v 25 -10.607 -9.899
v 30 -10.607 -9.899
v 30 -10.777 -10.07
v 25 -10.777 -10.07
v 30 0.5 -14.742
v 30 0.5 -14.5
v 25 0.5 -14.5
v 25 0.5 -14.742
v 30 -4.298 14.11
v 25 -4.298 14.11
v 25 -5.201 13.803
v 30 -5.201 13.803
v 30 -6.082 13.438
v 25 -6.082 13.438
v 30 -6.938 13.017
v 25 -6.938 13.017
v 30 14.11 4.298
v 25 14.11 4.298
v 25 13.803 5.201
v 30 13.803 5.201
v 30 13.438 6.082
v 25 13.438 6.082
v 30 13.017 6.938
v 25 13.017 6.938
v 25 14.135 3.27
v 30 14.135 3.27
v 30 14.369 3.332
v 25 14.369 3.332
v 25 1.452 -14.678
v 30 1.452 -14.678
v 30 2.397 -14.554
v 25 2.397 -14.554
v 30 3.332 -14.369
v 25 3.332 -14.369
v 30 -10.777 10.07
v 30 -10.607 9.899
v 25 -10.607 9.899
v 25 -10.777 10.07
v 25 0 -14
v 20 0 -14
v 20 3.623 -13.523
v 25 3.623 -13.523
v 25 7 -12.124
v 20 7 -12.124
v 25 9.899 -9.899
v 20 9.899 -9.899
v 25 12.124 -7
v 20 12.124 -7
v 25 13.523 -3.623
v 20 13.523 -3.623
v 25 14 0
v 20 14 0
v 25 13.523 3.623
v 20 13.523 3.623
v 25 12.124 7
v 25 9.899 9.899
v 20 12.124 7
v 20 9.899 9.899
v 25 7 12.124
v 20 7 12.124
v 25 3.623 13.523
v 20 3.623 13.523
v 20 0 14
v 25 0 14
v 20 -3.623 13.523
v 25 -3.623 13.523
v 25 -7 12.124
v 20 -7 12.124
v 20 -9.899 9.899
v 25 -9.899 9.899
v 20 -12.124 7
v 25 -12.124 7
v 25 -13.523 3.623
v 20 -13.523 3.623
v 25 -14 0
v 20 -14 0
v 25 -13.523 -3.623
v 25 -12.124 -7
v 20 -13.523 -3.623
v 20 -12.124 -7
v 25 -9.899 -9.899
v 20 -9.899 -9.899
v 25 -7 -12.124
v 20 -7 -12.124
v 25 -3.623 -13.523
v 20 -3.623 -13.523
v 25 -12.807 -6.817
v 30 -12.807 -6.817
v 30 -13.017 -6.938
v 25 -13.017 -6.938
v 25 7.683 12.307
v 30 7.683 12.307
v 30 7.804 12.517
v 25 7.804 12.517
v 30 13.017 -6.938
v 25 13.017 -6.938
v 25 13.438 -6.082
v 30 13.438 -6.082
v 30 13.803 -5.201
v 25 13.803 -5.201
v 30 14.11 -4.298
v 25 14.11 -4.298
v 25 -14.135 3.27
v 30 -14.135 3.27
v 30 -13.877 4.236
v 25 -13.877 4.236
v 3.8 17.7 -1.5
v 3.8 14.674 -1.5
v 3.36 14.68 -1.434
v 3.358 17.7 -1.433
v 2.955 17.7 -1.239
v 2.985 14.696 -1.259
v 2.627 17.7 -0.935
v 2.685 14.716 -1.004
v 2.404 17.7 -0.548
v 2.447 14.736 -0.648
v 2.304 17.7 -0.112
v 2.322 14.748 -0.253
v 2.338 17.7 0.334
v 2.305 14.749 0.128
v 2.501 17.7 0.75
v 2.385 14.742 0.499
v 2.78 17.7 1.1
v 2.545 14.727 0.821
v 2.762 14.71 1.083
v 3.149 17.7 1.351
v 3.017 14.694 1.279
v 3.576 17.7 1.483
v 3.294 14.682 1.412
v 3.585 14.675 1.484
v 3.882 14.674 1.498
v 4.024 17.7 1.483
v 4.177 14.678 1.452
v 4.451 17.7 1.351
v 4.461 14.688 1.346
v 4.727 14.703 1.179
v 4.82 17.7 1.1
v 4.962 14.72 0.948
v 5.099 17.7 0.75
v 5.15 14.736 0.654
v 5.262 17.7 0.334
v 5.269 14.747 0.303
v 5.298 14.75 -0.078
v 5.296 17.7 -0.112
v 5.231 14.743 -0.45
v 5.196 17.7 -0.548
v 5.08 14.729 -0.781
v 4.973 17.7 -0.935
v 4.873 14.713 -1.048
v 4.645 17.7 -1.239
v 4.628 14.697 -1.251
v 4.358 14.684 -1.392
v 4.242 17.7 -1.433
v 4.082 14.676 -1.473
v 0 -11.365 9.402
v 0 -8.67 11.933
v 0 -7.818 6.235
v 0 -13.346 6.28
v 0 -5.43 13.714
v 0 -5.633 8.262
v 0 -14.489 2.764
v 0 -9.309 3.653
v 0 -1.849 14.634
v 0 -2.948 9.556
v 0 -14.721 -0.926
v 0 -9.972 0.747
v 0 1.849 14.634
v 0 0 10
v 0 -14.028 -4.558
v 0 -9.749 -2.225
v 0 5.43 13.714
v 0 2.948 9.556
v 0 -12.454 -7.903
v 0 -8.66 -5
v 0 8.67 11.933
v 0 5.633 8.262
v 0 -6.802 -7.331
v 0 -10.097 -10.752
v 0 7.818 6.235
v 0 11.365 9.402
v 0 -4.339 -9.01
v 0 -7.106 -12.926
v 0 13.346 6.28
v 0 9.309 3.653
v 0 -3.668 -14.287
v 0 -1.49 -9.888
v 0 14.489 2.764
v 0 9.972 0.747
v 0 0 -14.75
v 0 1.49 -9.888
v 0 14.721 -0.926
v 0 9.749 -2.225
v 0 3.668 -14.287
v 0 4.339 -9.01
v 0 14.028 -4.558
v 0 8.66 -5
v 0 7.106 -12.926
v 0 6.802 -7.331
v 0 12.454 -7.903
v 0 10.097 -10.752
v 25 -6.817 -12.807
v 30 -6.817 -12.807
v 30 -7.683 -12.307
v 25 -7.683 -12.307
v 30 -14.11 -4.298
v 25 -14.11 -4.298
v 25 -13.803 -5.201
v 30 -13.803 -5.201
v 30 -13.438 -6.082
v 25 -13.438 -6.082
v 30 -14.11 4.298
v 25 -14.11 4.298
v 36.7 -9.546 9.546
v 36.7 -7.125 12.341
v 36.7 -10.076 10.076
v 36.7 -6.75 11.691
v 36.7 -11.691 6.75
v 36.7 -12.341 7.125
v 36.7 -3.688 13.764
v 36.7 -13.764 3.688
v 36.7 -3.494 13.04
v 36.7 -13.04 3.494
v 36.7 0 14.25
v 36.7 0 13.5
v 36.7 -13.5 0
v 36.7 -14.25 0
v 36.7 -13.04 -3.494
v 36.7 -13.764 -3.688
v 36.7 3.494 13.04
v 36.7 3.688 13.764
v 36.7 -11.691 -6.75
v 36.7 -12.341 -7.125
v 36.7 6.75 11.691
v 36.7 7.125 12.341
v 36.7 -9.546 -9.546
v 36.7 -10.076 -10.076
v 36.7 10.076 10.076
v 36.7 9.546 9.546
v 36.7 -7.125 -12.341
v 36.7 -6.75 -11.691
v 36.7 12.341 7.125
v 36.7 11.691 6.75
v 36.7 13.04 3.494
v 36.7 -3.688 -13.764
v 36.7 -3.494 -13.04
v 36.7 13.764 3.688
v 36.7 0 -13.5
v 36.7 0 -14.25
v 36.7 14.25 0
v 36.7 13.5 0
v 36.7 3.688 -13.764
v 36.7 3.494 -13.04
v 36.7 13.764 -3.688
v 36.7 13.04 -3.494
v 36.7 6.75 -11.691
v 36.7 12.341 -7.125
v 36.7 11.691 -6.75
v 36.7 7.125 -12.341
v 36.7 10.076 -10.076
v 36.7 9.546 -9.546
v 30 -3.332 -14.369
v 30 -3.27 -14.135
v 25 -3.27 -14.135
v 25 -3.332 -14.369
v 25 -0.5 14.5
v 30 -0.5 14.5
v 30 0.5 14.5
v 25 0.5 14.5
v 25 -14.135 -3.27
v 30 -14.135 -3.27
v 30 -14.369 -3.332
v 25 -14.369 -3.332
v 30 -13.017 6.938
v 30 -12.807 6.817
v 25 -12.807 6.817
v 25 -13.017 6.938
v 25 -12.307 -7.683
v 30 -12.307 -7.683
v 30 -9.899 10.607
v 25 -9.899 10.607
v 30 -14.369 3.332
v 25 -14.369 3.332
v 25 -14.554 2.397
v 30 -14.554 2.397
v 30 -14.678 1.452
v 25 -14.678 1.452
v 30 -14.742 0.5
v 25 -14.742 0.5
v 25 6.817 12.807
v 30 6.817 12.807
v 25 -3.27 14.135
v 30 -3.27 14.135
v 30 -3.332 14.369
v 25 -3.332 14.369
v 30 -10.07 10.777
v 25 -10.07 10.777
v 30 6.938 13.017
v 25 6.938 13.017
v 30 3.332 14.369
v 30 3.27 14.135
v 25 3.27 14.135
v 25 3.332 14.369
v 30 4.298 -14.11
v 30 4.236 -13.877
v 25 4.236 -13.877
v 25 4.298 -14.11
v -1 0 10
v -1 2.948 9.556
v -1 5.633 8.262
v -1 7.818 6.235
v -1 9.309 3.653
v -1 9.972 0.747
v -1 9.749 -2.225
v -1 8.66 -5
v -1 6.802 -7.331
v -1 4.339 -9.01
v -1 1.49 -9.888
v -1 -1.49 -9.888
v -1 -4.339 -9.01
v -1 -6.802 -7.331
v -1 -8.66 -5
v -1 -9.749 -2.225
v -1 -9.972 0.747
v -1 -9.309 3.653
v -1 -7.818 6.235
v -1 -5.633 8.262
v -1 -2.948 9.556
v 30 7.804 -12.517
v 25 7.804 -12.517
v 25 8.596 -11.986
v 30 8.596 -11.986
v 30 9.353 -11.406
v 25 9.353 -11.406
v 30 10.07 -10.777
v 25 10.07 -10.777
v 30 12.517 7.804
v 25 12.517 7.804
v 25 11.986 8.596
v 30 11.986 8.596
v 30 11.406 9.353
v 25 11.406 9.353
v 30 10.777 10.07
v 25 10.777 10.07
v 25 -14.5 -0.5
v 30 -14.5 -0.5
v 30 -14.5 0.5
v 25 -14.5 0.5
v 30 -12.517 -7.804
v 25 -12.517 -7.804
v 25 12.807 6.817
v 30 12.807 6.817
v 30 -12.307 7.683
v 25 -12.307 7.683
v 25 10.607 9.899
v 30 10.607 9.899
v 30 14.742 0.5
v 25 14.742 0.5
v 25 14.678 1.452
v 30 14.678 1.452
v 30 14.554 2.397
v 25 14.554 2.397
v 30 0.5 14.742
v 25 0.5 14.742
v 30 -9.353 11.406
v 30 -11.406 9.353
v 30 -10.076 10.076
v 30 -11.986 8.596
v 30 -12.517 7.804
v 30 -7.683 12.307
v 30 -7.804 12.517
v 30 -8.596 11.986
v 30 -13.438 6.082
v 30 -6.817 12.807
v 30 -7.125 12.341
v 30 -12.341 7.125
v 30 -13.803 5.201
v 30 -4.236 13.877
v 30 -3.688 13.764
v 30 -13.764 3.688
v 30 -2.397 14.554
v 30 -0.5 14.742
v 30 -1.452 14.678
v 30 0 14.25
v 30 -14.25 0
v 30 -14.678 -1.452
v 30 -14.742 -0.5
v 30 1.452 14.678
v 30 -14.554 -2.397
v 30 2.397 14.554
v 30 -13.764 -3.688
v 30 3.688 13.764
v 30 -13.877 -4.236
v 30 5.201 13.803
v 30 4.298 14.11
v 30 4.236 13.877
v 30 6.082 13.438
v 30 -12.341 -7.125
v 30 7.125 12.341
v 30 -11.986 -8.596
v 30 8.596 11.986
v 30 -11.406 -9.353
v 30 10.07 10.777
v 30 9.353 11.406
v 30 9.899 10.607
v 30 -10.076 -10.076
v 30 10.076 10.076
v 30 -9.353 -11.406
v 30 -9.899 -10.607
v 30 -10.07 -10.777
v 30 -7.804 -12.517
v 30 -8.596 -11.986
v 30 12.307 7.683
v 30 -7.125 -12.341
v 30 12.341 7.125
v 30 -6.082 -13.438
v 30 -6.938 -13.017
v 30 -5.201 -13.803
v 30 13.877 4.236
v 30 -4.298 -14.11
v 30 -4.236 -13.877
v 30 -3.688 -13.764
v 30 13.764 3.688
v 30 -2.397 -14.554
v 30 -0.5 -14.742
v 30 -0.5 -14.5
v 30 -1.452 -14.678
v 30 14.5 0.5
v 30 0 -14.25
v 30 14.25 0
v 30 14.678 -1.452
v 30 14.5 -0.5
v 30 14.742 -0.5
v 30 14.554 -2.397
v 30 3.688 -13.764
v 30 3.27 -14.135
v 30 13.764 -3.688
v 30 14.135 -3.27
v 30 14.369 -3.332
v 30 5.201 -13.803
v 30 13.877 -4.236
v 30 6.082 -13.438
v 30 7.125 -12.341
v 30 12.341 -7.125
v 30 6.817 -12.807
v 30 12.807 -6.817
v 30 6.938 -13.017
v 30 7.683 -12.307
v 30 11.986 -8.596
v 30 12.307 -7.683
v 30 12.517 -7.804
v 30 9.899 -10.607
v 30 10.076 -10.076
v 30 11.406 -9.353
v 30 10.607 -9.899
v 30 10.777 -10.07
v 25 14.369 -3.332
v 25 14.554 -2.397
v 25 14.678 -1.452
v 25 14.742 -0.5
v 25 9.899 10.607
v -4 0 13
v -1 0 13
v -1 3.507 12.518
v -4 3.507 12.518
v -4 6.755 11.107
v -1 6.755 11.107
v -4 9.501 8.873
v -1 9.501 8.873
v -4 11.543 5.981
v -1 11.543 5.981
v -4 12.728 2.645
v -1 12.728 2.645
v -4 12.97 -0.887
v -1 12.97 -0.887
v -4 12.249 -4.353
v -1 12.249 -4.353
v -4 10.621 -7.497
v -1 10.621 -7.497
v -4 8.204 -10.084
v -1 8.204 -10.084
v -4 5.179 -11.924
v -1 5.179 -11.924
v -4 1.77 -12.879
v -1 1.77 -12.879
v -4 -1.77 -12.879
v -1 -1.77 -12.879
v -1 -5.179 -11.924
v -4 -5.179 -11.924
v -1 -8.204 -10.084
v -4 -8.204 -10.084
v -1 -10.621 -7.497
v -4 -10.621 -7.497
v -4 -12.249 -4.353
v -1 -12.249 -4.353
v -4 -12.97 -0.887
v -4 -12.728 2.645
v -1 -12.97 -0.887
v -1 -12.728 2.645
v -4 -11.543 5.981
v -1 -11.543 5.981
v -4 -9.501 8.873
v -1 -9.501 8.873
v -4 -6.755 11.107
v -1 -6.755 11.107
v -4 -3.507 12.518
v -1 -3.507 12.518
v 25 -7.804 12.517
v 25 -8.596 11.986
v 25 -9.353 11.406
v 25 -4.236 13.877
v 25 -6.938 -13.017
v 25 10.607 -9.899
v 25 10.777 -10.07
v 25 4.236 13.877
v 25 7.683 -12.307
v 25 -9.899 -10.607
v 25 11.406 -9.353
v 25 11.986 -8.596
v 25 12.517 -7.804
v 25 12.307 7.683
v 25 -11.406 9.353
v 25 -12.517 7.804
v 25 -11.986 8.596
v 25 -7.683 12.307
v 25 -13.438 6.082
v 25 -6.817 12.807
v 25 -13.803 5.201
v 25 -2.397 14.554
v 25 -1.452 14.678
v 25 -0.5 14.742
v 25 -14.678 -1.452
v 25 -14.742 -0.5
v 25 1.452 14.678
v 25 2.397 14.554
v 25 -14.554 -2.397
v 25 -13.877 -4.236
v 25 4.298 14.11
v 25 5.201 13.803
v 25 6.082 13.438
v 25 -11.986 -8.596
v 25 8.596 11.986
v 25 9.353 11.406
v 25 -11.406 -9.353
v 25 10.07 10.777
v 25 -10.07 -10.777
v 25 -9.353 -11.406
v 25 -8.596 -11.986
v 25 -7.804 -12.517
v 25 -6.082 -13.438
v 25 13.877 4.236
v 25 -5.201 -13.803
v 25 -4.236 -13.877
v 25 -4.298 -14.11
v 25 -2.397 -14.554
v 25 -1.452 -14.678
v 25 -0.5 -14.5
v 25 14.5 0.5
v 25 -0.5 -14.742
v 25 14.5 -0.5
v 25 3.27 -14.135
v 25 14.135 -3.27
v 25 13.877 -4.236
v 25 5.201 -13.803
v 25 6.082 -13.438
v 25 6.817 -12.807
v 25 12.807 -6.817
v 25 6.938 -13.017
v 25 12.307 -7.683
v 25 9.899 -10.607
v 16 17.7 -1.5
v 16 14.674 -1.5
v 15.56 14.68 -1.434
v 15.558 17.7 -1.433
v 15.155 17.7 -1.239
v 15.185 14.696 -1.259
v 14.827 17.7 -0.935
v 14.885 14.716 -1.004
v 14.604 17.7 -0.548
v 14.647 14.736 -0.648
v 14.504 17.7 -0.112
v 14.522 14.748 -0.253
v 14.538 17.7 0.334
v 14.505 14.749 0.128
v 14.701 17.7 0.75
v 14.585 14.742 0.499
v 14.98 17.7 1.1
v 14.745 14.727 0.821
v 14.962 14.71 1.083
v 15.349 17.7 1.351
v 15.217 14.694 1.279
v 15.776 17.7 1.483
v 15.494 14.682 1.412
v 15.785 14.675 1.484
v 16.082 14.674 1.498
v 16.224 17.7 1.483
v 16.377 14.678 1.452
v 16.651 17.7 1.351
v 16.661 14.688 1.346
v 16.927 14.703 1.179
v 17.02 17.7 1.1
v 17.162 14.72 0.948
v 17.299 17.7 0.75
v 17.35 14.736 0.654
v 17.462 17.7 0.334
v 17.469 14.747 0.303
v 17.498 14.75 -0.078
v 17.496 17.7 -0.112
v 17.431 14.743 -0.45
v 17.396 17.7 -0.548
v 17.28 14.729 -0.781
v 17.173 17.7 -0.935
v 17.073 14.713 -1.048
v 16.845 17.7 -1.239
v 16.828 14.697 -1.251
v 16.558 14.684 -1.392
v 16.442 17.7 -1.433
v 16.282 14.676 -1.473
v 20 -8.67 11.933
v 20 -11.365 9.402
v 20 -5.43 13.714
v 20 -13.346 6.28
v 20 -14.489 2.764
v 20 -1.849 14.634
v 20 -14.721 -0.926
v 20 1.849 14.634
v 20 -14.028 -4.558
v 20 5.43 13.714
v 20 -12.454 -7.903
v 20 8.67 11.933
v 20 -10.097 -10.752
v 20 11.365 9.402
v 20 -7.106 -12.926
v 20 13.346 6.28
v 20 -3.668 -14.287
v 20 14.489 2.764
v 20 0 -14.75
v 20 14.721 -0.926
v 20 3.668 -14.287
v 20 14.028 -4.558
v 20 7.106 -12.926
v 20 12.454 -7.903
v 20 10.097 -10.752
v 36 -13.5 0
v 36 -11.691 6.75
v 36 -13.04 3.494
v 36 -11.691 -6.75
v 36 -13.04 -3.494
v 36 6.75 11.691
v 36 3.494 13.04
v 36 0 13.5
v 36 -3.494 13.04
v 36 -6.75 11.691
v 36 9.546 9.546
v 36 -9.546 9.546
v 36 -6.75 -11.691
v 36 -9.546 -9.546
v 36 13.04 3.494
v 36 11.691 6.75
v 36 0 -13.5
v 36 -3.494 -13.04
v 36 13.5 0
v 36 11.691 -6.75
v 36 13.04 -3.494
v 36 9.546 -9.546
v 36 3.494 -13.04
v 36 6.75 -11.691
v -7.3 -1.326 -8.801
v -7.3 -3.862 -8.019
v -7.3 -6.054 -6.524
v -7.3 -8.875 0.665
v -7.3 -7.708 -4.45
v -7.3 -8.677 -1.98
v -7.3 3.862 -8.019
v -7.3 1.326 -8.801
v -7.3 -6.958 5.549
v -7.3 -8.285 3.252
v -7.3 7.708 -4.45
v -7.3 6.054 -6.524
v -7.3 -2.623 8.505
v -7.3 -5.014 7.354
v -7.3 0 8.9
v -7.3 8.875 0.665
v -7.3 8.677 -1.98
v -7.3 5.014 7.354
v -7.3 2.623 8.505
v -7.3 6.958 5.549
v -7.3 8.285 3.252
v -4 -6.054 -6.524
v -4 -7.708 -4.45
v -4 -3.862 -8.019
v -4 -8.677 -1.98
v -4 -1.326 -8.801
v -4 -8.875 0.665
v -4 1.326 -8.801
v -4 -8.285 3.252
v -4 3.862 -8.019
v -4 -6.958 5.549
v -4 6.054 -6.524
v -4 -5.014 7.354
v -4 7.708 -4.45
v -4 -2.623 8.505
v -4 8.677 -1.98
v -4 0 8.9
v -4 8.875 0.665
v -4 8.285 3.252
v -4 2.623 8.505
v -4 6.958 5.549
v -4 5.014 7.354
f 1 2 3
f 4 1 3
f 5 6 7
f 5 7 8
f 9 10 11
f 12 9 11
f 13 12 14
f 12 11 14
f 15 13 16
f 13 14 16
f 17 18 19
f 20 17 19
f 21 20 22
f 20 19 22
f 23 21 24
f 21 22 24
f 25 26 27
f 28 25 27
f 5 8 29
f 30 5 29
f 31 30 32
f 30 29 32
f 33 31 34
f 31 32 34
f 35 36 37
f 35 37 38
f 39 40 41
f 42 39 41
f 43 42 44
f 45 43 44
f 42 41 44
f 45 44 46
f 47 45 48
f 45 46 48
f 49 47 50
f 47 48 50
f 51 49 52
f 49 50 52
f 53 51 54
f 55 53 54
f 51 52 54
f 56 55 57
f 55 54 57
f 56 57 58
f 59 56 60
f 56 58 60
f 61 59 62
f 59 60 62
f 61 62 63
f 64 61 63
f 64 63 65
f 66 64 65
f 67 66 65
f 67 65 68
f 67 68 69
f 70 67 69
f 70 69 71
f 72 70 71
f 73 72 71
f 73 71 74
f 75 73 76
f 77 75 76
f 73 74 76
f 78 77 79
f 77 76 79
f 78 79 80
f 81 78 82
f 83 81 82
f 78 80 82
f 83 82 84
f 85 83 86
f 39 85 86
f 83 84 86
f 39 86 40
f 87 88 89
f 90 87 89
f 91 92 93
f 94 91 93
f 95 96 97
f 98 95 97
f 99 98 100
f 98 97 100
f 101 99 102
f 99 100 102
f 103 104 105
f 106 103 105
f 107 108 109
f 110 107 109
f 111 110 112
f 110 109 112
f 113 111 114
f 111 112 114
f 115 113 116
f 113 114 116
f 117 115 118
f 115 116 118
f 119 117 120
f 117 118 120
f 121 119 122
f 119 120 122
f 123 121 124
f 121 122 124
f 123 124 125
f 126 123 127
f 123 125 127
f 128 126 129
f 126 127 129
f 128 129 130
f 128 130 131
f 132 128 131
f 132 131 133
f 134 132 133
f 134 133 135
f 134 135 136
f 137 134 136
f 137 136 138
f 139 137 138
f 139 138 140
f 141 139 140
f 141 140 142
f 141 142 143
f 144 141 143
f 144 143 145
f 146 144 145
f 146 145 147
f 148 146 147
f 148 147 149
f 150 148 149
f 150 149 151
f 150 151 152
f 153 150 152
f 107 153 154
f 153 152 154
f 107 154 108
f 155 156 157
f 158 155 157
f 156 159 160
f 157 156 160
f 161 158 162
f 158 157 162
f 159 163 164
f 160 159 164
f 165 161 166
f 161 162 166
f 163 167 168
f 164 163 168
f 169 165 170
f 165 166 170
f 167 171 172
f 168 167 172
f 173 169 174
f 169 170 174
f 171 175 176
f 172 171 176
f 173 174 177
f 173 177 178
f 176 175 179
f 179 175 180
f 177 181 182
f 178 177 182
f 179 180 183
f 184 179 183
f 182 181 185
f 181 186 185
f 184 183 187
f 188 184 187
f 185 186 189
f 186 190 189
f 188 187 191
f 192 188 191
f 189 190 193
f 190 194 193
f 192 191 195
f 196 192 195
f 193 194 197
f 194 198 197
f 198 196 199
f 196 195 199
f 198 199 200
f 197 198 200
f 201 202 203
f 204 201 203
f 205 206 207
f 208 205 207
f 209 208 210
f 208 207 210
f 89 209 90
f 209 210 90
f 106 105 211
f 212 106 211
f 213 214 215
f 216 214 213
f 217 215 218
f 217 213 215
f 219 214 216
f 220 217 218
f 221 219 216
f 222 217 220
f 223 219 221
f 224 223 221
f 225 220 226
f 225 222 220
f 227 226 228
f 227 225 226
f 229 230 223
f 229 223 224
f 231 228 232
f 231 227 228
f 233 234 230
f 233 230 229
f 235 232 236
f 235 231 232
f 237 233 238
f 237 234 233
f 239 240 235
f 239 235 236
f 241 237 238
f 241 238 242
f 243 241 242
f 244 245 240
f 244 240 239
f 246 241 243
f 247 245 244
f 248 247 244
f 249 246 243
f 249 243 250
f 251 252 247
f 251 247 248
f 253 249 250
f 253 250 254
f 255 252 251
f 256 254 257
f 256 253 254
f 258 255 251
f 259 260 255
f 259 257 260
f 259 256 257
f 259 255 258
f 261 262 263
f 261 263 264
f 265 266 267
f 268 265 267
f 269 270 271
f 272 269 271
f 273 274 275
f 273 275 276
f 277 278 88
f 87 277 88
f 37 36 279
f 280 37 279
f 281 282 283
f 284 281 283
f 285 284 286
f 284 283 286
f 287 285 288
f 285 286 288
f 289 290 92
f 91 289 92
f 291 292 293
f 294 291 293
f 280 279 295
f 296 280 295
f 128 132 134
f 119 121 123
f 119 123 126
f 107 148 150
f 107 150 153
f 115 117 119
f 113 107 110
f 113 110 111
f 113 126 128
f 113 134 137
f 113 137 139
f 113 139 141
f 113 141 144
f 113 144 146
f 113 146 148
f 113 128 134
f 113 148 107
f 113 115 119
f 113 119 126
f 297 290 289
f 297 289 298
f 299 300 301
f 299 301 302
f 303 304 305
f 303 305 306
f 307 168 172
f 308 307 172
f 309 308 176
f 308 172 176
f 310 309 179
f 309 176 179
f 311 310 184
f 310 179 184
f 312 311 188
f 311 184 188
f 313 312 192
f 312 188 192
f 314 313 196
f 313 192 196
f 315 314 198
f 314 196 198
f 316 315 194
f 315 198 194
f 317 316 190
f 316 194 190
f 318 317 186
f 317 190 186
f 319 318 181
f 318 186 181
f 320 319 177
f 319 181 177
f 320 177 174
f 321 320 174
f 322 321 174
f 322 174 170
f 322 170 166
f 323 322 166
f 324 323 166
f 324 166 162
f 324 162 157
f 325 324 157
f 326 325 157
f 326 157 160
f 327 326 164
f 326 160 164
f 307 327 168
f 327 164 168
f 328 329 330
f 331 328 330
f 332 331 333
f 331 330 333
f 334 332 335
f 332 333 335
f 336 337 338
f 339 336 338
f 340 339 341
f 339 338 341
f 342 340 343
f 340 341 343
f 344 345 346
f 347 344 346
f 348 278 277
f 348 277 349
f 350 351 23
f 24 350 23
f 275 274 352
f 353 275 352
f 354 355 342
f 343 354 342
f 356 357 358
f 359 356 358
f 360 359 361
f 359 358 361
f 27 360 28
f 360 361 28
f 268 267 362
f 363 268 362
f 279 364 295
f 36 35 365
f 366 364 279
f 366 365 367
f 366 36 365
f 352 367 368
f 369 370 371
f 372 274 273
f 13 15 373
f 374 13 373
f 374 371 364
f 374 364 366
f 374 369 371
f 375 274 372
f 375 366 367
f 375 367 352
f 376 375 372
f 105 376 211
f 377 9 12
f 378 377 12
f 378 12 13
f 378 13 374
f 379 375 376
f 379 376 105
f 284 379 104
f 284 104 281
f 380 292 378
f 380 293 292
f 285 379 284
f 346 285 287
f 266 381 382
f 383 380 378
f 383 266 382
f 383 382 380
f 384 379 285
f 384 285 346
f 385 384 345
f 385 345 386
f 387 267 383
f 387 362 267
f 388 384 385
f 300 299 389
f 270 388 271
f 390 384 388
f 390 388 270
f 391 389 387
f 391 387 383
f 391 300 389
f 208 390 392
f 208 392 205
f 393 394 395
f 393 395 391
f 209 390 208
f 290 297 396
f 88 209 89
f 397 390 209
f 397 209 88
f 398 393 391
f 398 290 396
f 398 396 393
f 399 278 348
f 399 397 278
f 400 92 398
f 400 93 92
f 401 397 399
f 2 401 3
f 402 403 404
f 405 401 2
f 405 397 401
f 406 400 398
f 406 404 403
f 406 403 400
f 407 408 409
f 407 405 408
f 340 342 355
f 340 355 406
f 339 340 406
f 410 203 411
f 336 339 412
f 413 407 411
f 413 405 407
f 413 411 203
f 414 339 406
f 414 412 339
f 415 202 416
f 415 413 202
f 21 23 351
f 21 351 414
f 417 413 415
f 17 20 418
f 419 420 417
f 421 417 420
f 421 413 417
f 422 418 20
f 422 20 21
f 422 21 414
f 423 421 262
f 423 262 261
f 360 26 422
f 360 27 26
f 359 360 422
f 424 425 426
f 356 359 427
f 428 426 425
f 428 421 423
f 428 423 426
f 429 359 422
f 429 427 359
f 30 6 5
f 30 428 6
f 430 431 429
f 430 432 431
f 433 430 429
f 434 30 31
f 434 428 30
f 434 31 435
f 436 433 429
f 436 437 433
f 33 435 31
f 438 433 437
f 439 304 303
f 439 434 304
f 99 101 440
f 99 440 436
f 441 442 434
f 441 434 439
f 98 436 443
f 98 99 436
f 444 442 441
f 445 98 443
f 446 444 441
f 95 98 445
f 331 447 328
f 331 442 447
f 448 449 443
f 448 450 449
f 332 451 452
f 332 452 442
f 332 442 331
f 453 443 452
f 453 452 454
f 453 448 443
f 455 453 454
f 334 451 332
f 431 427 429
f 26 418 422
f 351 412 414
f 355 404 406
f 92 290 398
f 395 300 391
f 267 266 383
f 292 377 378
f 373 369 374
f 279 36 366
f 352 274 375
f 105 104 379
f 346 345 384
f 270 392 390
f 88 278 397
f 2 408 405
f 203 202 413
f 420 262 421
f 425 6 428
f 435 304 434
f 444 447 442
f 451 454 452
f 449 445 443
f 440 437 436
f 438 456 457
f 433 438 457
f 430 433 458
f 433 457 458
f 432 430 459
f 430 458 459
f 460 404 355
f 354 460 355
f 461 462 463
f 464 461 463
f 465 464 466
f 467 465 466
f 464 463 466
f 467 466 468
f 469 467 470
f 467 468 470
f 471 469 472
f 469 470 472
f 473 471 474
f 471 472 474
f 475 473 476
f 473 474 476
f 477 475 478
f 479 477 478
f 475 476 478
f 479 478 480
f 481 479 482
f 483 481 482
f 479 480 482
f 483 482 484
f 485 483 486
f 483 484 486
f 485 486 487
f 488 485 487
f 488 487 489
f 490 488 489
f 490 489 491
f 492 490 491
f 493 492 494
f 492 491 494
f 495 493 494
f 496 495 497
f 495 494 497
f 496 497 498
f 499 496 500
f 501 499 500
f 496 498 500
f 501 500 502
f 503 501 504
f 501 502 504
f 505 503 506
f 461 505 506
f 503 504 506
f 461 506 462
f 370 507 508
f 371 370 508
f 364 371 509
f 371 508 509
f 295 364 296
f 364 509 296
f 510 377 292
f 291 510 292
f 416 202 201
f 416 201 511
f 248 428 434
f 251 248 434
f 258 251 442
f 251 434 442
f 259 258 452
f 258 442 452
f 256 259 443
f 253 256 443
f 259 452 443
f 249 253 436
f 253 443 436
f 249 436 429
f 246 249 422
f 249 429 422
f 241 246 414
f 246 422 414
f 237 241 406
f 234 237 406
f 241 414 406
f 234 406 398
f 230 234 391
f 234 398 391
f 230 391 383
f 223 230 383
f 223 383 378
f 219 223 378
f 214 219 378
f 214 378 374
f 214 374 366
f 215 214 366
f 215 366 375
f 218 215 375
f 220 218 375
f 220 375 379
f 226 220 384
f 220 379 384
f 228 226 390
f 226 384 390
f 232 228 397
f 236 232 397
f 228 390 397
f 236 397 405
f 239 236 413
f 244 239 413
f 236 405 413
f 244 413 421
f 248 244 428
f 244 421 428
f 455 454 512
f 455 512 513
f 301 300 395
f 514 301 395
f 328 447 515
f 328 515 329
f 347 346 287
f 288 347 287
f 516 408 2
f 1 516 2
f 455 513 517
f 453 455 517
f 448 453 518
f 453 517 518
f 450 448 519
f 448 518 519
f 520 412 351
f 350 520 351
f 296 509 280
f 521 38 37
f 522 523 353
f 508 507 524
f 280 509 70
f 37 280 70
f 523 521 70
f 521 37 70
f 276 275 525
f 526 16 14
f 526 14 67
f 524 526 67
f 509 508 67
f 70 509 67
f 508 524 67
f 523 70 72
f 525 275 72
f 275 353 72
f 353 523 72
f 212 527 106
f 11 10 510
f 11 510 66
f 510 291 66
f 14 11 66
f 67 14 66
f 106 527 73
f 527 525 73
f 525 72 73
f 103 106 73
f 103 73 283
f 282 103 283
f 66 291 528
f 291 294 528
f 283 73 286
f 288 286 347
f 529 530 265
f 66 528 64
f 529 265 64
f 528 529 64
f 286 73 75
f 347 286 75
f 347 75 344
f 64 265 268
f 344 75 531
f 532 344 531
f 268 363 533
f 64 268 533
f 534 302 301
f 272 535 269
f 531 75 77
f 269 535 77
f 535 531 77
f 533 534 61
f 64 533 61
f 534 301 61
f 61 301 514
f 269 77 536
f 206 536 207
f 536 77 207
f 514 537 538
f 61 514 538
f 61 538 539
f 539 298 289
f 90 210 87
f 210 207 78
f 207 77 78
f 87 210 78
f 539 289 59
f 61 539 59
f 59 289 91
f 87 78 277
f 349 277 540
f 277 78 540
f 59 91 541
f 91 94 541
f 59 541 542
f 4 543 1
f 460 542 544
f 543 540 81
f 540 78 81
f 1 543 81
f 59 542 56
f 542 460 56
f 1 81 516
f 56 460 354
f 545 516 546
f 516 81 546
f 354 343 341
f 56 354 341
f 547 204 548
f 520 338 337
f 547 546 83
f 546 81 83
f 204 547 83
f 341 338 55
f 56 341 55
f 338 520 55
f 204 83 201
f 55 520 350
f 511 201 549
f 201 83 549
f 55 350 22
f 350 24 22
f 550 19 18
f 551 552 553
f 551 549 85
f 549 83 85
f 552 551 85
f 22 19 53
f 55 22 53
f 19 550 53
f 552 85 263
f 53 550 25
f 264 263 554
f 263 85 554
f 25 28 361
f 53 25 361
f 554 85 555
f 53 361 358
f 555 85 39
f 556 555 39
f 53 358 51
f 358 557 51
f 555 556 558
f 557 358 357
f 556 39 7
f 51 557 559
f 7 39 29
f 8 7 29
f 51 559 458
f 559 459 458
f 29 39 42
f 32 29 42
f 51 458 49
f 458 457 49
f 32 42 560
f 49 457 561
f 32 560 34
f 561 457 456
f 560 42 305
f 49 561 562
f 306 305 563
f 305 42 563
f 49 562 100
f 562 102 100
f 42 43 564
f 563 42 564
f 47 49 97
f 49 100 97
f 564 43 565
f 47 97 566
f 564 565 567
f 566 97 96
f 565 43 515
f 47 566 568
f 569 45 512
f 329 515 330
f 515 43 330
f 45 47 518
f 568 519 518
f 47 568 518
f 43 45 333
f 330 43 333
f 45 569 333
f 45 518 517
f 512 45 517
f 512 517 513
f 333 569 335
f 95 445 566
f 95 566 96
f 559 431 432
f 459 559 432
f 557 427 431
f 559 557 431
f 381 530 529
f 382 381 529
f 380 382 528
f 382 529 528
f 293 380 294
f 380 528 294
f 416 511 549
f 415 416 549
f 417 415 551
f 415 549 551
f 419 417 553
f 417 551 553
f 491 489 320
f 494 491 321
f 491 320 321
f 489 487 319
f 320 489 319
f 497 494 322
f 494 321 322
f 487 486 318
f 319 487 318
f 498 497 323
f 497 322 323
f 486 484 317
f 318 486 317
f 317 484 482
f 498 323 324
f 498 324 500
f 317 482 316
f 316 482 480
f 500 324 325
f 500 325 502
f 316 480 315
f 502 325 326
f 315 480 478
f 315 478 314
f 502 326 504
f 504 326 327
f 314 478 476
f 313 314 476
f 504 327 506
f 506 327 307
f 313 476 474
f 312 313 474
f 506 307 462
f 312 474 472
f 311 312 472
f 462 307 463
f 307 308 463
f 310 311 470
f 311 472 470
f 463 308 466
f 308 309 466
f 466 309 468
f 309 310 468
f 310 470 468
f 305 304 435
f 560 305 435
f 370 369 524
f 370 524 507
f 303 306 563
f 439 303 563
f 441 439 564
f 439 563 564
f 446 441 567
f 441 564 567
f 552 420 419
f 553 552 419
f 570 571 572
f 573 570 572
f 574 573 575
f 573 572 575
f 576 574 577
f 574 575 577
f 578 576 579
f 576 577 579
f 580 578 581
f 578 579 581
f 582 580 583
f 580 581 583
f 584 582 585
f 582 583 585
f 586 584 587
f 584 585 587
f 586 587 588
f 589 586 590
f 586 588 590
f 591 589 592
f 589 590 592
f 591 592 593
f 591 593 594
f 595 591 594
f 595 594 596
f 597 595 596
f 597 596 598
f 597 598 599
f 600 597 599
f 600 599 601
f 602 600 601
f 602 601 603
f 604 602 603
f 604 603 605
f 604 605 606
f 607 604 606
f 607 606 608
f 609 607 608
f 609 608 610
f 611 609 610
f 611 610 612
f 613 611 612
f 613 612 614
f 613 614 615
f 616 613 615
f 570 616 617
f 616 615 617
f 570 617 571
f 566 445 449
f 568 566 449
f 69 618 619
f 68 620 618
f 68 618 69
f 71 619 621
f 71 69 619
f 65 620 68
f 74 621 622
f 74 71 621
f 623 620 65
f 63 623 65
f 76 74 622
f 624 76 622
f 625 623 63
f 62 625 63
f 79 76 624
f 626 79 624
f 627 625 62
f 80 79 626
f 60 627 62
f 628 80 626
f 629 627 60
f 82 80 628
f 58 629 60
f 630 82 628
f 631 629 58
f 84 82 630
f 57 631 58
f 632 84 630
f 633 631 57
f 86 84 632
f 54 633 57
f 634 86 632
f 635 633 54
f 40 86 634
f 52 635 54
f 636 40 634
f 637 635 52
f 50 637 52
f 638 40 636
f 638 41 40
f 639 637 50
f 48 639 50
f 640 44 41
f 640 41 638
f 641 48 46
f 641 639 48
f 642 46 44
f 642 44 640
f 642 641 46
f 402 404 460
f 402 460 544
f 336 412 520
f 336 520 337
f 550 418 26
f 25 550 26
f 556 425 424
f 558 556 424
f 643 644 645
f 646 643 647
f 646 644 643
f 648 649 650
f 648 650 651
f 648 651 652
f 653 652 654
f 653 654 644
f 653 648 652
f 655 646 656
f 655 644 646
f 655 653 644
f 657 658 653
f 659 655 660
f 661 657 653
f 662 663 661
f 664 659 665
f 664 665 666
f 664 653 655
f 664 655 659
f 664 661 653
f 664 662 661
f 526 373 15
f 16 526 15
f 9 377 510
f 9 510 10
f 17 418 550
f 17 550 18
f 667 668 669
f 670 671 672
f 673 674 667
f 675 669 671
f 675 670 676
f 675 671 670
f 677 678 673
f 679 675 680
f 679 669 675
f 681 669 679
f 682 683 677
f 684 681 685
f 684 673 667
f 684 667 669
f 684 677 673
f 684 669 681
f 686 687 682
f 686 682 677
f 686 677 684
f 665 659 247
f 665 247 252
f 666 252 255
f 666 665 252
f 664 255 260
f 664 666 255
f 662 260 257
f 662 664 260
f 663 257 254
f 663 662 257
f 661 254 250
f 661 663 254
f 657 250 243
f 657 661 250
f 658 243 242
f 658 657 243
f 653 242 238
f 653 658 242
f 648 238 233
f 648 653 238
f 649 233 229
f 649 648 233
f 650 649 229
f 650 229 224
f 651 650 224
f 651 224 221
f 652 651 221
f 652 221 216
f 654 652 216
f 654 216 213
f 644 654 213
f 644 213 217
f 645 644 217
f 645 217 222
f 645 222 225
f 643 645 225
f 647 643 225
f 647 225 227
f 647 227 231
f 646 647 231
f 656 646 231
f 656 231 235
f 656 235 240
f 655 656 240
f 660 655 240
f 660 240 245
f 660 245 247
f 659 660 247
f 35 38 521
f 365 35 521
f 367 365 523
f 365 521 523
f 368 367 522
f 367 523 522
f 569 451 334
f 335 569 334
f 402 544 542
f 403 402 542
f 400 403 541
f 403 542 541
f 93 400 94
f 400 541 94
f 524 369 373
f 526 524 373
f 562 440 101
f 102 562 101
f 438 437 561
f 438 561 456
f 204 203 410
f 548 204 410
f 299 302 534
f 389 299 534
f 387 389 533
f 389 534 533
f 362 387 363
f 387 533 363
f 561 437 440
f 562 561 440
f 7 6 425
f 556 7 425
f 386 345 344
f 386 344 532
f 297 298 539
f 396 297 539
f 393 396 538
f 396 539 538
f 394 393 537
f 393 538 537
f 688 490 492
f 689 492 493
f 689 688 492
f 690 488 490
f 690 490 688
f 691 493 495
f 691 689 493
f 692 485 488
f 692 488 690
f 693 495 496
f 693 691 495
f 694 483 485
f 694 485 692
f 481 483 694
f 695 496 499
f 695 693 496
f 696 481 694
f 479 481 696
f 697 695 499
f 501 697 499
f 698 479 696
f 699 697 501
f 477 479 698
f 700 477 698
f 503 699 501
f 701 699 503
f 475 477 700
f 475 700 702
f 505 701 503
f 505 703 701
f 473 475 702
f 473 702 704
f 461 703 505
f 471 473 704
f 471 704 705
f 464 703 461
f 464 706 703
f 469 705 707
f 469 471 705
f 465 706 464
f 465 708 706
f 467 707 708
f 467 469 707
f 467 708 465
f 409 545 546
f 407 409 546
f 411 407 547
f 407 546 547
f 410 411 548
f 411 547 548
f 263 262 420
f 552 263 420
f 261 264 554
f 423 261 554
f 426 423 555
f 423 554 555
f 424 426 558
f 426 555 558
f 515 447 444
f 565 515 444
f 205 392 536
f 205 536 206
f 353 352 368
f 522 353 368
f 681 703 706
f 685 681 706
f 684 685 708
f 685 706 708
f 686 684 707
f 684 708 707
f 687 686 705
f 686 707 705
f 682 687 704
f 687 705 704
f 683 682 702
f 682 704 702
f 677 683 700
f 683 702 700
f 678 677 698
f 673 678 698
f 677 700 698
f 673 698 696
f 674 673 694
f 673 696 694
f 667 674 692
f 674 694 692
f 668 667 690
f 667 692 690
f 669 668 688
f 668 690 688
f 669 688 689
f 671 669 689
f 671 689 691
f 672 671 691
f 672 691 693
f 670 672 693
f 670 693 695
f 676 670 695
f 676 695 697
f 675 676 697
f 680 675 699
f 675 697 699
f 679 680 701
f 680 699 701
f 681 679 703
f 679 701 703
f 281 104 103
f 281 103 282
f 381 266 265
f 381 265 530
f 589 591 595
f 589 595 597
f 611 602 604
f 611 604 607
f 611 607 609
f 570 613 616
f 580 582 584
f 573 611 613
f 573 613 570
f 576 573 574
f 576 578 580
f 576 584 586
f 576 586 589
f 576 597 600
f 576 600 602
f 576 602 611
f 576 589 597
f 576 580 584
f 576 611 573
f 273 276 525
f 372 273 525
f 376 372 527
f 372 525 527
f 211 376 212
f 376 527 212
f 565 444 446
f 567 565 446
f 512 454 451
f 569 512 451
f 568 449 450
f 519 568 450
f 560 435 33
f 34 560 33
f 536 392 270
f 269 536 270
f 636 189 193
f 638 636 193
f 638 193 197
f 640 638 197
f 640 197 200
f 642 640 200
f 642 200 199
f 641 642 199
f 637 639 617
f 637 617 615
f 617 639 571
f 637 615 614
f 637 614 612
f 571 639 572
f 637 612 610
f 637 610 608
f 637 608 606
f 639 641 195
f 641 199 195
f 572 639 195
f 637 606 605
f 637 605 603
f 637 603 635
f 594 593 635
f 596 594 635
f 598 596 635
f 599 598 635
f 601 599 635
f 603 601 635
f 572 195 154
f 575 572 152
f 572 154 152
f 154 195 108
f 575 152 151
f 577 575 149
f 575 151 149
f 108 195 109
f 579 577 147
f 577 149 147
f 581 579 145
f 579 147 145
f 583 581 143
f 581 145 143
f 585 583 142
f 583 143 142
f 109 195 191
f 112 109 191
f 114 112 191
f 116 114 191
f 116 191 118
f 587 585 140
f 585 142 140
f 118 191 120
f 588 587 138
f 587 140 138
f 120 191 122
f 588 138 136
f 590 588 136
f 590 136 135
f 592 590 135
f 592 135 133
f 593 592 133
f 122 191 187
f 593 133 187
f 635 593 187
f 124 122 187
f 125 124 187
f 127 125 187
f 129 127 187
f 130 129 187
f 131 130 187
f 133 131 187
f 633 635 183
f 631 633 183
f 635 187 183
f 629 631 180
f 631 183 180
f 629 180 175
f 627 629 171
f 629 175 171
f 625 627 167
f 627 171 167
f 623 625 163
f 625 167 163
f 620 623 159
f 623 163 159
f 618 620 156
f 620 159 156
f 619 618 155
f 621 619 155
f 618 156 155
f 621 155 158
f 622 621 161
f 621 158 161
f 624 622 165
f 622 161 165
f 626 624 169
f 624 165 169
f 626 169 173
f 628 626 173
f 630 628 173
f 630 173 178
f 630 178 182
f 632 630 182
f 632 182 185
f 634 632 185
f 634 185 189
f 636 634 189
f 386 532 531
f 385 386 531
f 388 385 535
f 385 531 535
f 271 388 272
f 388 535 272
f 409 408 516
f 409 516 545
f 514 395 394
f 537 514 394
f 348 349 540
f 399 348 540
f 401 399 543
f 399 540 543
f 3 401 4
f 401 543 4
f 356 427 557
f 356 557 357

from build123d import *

# Parameters (mm, degrees)
SKETCH_1_R               = 14.75
EXTRUDE_1_DEPTH          = 20
SKETCH_2_R               = 14
EXTRUDE_2_DEPTH          = 5
SKETCH_3_R               = 14.75
EXTRUDE_3_DEPTH          = 5
SKETCH_4_R               = 14.25
SKETCH_4_R_2             = 13.5
EXTRUDE_4_DEPTH          = 6.7
SKETCH_5_R               = 13.5
EXTRUDE_5_DEPTH          = 6
SKETCH_6_W               = 1
SKETCH_6_H               = 10.048644724
CUT_EXTRUDE_1_DEPTH      = 15
PATTERN_CIRCULAR_1_COUNT = 24
SKETCH_7_R               = 1.5
EXTRUDE_6_DEPTH          = 17.7
SKETCH_8_R               = 10
EXTRUDE_7_DEPTH          = 1
SKETCH_9_R               = 13
EXTRUDE_8_DEPTH          = 3
SKETCH_10_R              = 8.9
EXTRUDE_9_DEPTH          = 3.3


with BuildPart() as part:
    # 草图1 → 凸台-拉伸1 (new body)
    with BuildSketch(Plane(origin=(0, 0, 0), x_dir=(0, 0, -1), z_dir=(1, 0, 0))):
        Circle(SKETCH_1_R)
    extrude(amount=EXTRUDE_1_DEPTH)

    # 草图2 → 凸台-拉伸2 (add)
    with BuildSketch(Plane(origin=(20, 0, 0), x_dir=(0, 0, -1), z_dir=(1, 0, 0))):
        Circle(SKETCH_2_R)
    extrude(amount=EXTRUDE_2_DEPTH)

    # 草图3 → 凸台-拉伸3 (add)
    with BuildSketch(Plane(origin=(25, 0, 0), x_dir=(0, 0, -1), z_dir=(1, 0, 0))):
        Circle(SKETCH_3_R)
    extrude(amount=EXTRUDE_3_DEPTH)

    # 草图4 → 凸台-拉伸4 (add)
    with BuildSketch(Plane(origin=(30, 0, 0), x_dir=(0, 0, -1), z_dir=(1, 0, 0))):
        Circle(SKETCH_4_R)
        Circle(SKETCH_4_R_2, mode=Mode.SUBTRACT)
    extrude(amount=EXTRUDE_4_DEPTH)

    # 草图5 → 凸台-拉伸5 (add)
    with BuildSketch(Plane(origin=(30, 0, 0), x_dir=(0, 0, -1), z_dir=(1, 0, 0))):
        Circle(SKETCH_5_R)
    extrude(amount=EXTRUDE_5_DEPTH)

    # 草图6 → 切除-拉伸1 (cut)
    with BuildSketch(Plane(origin=(36, 0, 0), x_dir=(0, 0, -1), z_dir=(1, 0, 0))):
        with Locations((0, 19.524322362)):
            Rectangle(SKETCH_6_W, SKETCH_6_H)
    cut_extrude_1 = extrude(amount=-CUT_EXTRUDE_1_DEPTH, mode=Mode.SUBTRACT)

    # 阵列(圆周)1: 切除-拉伸1 ×24 about axis
    pattern_circular_1_axis = Axis((0, 0, 0), (1, 0, 0))
    for i in range(1, PATTERN_CIRCULAR_1_COUNT):
        add(cut_extrude_1.rotate(pattern_circular_1_axis, i * 360 / PATTERN_CIRCULAR_1_COUNT), mode=Mode.SUBTRACT)

    # 草图7 → 凸台-拉伸6 (add)
    with BuildSketch(Plane(origin=(0, 0, 0), x_dir=(1, 0, 0), z_dir=(0, 1, 0))):
        with Locations(Location((3.8, 0, 0), (0, 0, 90))):
            Circle(SKETCH_7_R)
        with Locations(Location((16, 0, 0), (0, 0, 90))):
            Circle(SKETCH_7_R)
    extrude(amount=EXTRUDE_6_DEPTH)

    # 草图8 → 凸台-拉伸7 (add)
    with BuildSketch(Plane.ZY):
        Circle(SKETCH_8_R)
    extrude(amount=EXTRUDE_7_DEPTH)

    # 草图9 → 凸台-拉伸8 (add)
    with BuildSketch(Plane.ZY.offset(1)):
        Circle(SKETCH_9_R)
    extrude(amount=EXTRUDE_8_DEPTH)

    # 草图10 → 凸台-拉伸9 (add)
    with BuildSketch(Plane.ZY.offset(4)):
        Circle(SKETCH_10_R)
    extrude(amount=EXTRUDE_9_DEPTH)


solid = part.part
